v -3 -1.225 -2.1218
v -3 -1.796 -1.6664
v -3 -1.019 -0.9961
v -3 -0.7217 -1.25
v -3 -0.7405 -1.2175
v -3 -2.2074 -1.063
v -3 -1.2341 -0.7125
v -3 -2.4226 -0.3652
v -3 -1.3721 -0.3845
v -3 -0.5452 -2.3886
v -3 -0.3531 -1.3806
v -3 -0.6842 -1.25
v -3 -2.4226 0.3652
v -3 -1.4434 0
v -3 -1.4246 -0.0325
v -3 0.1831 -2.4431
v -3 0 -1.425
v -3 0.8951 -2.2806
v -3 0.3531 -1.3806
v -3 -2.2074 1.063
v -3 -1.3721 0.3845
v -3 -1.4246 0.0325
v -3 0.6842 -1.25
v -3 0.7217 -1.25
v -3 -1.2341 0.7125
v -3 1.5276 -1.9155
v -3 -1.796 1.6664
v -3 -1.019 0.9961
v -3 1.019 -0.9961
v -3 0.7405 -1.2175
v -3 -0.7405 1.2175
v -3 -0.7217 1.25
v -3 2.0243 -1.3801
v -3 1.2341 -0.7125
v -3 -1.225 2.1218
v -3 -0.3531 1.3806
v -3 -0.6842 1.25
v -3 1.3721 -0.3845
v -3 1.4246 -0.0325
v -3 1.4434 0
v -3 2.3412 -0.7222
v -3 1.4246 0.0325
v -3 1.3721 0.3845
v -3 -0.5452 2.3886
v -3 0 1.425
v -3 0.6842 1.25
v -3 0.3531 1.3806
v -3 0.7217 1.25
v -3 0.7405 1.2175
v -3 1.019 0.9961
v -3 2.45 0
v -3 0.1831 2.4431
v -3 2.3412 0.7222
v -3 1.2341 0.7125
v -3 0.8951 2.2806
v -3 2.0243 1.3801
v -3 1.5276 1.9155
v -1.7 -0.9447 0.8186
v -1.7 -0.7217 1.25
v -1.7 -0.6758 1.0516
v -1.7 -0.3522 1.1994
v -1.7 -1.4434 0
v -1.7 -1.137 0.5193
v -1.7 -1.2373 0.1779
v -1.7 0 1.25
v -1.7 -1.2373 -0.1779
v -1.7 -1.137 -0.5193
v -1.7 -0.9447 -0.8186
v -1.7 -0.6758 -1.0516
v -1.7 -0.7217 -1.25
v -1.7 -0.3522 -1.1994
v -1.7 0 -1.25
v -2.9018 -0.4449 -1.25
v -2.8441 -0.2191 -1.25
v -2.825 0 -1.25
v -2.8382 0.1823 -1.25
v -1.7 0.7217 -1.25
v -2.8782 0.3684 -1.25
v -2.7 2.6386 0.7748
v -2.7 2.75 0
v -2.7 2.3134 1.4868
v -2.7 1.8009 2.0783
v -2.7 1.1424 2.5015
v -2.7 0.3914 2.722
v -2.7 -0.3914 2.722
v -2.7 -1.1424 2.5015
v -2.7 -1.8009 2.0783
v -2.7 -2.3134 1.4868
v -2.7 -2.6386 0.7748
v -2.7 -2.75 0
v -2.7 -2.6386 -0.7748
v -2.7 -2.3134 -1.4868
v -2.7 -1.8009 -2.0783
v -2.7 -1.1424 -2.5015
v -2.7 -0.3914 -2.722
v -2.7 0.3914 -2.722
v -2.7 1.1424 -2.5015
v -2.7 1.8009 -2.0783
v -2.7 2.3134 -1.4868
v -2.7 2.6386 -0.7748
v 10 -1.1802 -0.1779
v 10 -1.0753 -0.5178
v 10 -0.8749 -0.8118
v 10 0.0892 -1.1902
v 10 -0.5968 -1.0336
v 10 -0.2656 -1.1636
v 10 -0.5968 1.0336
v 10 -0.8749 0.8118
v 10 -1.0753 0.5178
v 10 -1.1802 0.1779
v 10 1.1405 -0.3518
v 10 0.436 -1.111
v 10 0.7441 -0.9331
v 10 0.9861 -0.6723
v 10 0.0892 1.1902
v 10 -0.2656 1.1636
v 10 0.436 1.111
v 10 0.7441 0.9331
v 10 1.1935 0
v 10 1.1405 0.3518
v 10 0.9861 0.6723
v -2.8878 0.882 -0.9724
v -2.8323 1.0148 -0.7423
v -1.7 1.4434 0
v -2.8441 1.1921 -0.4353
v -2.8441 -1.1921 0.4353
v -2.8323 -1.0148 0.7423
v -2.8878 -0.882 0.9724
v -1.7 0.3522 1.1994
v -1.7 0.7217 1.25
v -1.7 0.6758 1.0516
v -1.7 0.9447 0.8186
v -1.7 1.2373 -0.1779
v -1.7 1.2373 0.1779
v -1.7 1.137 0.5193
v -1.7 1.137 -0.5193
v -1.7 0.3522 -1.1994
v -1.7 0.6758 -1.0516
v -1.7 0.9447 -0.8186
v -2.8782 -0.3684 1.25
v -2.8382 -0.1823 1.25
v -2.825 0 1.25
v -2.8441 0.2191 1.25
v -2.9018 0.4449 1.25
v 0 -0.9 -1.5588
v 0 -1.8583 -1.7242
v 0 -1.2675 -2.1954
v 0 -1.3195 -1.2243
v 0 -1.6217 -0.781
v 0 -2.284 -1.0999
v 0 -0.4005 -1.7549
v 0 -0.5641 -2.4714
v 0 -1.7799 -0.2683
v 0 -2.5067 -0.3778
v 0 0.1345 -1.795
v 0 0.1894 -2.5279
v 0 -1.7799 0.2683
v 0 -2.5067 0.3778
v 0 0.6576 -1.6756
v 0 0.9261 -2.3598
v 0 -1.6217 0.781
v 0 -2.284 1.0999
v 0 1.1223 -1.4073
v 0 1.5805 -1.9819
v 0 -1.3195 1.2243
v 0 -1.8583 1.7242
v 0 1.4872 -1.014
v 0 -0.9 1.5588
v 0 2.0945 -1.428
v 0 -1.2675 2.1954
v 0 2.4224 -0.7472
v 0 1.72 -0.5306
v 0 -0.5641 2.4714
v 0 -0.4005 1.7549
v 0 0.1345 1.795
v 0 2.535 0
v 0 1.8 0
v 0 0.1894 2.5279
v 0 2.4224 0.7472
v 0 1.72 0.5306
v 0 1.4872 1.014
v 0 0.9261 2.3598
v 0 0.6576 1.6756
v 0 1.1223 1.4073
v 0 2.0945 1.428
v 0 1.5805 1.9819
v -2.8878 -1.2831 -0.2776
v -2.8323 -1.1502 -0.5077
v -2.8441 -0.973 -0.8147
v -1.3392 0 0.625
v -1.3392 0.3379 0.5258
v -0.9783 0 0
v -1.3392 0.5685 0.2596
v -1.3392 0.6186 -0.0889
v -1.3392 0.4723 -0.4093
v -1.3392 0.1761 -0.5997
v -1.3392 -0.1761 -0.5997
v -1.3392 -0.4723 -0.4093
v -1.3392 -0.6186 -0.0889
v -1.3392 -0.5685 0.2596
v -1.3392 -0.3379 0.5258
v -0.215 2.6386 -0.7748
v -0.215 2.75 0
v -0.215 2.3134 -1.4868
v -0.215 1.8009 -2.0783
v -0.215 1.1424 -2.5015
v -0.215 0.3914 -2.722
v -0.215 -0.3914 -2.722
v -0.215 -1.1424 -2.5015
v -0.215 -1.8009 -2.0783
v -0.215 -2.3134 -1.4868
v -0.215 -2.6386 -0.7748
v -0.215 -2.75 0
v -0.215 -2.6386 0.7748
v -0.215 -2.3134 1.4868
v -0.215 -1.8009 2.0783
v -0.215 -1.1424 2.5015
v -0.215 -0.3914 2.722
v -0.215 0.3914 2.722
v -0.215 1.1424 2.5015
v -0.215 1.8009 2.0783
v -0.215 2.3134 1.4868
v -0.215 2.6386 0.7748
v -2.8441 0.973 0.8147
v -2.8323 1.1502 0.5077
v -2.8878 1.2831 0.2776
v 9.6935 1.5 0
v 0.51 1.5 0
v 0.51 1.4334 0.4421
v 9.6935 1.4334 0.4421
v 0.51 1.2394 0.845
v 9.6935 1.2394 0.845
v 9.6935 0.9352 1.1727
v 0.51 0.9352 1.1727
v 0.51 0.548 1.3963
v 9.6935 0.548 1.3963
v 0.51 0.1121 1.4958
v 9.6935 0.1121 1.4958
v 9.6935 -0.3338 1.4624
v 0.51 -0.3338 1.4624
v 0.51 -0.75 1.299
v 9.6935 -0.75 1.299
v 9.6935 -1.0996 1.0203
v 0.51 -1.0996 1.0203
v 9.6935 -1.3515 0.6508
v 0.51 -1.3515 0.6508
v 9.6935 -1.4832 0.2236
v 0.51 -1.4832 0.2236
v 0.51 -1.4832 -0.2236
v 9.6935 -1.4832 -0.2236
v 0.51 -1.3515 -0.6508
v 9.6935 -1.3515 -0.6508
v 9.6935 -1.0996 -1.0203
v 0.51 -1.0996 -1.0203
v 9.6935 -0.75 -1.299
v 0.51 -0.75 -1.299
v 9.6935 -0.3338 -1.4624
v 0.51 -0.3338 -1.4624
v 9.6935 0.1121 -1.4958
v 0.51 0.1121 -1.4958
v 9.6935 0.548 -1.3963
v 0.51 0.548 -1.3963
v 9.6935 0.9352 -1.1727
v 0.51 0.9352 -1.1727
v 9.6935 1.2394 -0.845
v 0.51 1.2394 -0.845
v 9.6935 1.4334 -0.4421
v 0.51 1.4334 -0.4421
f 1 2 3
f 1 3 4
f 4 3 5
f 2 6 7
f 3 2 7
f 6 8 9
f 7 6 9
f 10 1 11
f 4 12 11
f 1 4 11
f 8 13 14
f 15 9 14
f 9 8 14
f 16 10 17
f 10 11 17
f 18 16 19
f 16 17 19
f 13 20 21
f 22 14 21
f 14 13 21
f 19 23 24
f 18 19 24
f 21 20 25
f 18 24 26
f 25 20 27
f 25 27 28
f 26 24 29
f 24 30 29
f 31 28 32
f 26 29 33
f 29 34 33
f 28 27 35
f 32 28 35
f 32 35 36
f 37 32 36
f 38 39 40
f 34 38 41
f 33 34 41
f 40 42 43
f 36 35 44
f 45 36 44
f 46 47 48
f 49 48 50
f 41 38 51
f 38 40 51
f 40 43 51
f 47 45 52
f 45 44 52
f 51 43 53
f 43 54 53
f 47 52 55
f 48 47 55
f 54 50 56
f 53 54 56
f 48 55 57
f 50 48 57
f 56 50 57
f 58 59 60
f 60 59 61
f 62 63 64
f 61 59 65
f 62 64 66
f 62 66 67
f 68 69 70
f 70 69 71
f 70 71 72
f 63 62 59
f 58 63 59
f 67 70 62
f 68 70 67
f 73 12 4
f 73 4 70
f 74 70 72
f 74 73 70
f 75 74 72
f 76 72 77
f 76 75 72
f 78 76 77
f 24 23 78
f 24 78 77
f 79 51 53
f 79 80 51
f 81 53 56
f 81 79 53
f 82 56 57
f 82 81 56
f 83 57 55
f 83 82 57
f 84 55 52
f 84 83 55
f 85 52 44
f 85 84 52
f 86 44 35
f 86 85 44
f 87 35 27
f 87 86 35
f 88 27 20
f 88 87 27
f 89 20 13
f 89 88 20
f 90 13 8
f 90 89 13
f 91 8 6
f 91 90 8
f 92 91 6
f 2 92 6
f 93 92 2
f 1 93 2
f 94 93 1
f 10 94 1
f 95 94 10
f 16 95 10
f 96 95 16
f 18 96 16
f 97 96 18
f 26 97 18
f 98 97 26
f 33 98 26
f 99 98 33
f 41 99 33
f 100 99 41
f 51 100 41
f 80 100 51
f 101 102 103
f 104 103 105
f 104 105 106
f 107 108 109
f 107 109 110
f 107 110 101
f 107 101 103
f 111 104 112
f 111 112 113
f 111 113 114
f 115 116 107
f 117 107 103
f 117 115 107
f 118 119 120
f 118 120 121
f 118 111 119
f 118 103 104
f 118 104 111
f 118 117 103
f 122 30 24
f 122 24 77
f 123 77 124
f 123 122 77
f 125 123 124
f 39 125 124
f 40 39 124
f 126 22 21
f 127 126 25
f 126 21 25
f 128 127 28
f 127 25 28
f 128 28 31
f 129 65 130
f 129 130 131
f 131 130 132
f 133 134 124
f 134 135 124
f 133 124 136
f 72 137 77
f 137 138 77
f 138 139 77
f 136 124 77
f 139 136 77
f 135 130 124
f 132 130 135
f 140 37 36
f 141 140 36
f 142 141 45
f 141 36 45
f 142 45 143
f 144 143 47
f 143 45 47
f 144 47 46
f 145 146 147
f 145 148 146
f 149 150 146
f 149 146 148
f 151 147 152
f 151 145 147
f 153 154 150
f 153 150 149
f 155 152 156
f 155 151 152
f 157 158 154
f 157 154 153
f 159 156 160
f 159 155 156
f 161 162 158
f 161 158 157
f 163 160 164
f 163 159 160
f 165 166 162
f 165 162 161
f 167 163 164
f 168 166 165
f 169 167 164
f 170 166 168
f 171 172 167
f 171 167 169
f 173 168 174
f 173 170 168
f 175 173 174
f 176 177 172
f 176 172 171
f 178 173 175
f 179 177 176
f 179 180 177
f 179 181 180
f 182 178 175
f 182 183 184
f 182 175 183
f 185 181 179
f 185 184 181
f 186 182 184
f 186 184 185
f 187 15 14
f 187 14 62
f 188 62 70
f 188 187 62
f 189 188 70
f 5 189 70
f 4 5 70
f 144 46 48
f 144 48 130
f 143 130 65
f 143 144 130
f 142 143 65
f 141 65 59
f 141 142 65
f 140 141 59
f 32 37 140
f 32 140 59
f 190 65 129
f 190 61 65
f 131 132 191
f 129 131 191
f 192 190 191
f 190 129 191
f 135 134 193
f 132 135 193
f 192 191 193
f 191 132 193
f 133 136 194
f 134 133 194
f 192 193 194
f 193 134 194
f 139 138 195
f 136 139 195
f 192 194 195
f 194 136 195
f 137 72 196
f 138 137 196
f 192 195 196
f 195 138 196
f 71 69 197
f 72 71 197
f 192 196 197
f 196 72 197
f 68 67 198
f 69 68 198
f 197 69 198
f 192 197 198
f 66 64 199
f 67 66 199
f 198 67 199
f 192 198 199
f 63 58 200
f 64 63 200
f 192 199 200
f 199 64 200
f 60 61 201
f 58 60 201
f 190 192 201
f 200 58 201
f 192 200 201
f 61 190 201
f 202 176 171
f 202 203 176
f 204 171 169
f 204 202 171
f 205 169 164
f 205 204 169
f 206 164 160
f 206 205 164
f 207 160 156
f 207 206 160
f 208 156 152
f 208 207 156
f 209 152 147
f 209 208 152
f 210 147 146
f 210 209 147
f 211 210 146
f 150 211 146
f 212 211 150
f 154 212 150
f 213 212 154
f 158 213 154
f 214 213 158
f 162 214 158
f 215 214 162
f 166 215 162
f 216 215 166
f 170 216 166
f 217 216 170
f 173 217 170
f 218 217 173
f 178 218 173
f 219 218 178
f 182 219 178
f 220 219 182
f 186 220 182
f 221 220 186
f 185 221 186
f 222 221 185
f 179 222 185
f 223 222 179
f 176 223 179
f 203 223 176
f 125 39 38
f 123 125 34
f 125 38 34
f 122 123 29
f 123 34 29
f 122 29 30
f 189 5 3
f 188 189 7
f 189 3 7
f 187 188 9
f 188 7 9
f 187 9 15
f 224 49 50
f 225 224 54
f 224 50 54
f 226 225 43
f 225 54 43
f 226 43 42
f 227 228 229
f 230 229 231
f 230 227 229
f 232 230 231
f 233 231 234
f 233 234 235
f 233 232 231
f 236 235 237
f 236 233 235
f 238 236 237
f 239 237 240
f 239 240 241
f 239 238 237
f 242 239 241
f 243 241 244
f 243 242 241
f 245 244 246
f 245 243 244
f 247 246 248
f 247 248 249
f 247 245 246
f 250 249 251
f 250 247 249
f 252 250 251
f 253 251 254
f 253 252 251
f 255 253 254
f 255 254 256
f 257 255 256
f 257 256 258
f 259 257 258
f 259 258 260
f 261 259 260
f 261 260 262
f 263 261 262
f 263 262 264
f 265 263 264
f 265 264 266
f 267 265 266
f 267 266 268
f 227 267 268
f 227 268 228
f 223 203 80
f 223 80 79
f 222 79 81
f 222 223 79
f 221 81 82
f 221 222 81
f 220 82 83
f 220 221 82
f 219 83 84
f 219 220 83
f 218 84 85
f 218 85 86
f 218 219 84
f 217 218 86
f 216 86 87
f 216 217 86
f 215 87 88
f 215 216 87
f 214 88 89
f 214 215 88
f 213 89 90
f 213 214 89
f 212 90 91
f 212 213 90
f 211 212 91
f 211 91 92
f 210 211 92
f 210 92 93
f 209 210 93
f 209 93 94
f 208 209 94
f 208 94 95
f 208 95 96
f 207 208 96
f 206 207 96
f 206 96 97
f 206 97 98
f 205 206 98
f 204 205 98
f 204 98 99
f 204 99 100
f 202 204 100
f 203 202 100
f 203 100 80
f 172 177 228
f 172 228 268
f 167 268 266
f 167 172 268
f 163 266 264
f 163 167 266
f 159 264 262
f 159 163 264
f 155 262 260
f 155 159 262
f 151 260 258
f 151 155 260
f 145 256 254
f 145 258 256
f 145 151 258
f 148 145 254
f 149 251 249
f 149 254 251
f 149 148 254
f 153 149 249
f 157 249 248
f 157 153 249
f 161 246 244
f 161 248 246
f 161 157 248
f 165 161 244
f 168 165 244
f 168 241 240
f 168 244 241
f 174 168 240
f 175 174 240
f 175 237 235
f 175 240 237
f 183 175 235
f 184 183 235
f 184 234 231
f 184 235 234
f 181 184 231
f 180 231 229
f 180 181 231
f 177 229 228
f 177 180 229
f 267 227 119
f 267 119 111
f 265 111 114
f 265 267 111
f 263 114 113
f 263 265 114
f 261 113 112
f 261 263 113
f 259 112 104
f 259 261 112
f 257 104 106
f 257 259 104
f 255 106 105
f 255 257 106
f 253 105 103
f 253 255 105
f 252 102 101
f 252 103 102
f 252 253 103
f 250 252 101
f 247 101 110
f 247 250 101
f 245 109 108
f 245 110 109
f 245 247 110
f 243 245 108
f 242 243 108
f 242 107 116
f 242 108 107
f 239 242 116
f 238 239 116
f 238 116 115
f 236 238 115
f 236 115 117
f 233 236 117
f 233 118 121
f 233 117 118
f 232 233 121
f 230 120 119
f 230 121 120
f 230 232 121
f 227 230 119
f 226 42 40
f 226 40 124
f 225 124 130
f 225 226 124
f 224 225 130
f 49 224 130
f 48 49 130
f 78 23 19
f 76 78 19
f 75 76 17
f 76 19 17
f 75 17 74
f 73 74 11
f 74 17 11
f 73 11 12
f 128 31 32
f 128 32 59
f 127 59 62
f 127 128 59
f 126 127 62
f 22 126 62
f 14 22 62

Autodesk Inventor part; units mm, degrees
sketch "Sketch_1" plane through (0, 0, 0) normal (0, 0, 1) x (1, 0, 0)
  line L0 (10, 0) -> (-3, 0)
  line L1 (-3, 0) -> (-3, 2.75)
  line L2 (-3, 2.75) -> (0, 2.75)
  line L3 (0, 2.75) -> (0, 1.8)
  line L4 (0, 1.8) -> (0.51, 1.5)
  line L5 (0.51, 1.5) -> (9.6935, 1.5)
  line L6 (9.6935, 1.5) -> (10, 1.1935)
  line L7 (10, 1.1935) -> (10, 0)
  line L8 (10, 0) -> (-3, 0)
revolve "Revolution1" add sketch "Sketch_1" angle 360 about axis through (10, 0, 0) along (1, 0, 0)
thread "Thread1" size "M3x0.5" class "6g" standard "ISO Metric profile" length 8.1935
sketch "Sketch_6" plane through (0, 0, 0) normal (0, 0, 1) x (1, 0, 0)
  line L0 (0, 0) -> (-3, 0)
  line L1 (-3, 3.3) -> (-3, 2.45)
  line L2 (-3, 2.45) -> (-2.7, 2.75)
  line L3 (-2.7, 2.75) -> (-0.215, 2.75)
  line L4 (-0.215, 2.75) -> (0, 2.535)
  line L5 (0, 2.535) -> (0, 3.3)
  line L6 (0, 3.3) -> (-3, 3.3)
revolve "Revolution2" cut sketch "Sketch_6" angle 360 about axis through (0, 0, 0) along (1, 0, 0)
sketch "Sketch3" plane through (-3, 0, 0) normal (-1, 0, 0) x (0, 0, 1)
  point P0 (0, 0)
hole "Hole1" at (-3, 0, 0) direction (1, 0, 0) diameter 2.5 depth 1.3 tip angle 120 countersink diameter 2.85 countersink angle 90
sketch "Sketch_2" plane through (-3, 0, 0) normal (1, 0, 0) x (0, 0, -1)
  line L0 (-1.25, -0.7217) -> (0, -1.4434)
  line L1 (0, -1.4434) -> (1.25, -0.7217)
  line L2 (1.25, -0.7217) -> (1.25, 0.7217)
  line L3 (1.25, 0.7217) -> (0, 1.4434)
  line L4 (0, 1.4434) -> (-1.25, 0.7217)
  line L5 (-1.25, 0.7217) -> (-1.25, -0.7217)
extrude "Extrusion1" cut sketch "Sketch_2" along normal mid plane 2.6
ref_plane "ANBAU_XY" through (0, 0, 0) normal (-1, 0, 0) x (0, 0, -1)
ref_plane "ANBAU_YZ" through (0, 0, 0) normal (0, 0, -1) x (0, -1, 0)
ref_plane "ANBAU_ZX" through (0, 0, 0) normal (0, -1, 0) x (-1, 0, 0)
ref_plane "IP1_XY" through (0, 0, 0) normal (1, 0, 0) x (0, 0, -1)
ref_plane "IP1_YZ" through (0, 0, 0) normal (0, 0, -1) x (0, 1, 0)
ref_plane "IP1_ZX" through (0, 0, 0) normal (0, 1, 0) x (1, 0, 0)
ref_plane "IP2_XY" through (-3, 0, 0) normal (1, 0, 0) x (0, 0, -1)
ref_plane "IP2_YZ" through (-3, 0, 0) normal (0, 0, -1) x (0, 1, 0)
ref_plane "IP2_ZX" through (-3, 0, 0) normal (0, 1, 0) x (1, 0, 0)
ref_plane "IP3_XY" through (10, 0, 0) normal (1, 0, 0) x (0, 0, -1)
ref_plane "IP3_YZ" through (10, 0, 0) normal (0, 0, -1) x (0, 1, 0)
ref_plane "IP3_ZX" through (10, 0, 0) normal (0, 1, 0) x (1, 0, 0)
properties part number "ISO-4762 M3x10"
